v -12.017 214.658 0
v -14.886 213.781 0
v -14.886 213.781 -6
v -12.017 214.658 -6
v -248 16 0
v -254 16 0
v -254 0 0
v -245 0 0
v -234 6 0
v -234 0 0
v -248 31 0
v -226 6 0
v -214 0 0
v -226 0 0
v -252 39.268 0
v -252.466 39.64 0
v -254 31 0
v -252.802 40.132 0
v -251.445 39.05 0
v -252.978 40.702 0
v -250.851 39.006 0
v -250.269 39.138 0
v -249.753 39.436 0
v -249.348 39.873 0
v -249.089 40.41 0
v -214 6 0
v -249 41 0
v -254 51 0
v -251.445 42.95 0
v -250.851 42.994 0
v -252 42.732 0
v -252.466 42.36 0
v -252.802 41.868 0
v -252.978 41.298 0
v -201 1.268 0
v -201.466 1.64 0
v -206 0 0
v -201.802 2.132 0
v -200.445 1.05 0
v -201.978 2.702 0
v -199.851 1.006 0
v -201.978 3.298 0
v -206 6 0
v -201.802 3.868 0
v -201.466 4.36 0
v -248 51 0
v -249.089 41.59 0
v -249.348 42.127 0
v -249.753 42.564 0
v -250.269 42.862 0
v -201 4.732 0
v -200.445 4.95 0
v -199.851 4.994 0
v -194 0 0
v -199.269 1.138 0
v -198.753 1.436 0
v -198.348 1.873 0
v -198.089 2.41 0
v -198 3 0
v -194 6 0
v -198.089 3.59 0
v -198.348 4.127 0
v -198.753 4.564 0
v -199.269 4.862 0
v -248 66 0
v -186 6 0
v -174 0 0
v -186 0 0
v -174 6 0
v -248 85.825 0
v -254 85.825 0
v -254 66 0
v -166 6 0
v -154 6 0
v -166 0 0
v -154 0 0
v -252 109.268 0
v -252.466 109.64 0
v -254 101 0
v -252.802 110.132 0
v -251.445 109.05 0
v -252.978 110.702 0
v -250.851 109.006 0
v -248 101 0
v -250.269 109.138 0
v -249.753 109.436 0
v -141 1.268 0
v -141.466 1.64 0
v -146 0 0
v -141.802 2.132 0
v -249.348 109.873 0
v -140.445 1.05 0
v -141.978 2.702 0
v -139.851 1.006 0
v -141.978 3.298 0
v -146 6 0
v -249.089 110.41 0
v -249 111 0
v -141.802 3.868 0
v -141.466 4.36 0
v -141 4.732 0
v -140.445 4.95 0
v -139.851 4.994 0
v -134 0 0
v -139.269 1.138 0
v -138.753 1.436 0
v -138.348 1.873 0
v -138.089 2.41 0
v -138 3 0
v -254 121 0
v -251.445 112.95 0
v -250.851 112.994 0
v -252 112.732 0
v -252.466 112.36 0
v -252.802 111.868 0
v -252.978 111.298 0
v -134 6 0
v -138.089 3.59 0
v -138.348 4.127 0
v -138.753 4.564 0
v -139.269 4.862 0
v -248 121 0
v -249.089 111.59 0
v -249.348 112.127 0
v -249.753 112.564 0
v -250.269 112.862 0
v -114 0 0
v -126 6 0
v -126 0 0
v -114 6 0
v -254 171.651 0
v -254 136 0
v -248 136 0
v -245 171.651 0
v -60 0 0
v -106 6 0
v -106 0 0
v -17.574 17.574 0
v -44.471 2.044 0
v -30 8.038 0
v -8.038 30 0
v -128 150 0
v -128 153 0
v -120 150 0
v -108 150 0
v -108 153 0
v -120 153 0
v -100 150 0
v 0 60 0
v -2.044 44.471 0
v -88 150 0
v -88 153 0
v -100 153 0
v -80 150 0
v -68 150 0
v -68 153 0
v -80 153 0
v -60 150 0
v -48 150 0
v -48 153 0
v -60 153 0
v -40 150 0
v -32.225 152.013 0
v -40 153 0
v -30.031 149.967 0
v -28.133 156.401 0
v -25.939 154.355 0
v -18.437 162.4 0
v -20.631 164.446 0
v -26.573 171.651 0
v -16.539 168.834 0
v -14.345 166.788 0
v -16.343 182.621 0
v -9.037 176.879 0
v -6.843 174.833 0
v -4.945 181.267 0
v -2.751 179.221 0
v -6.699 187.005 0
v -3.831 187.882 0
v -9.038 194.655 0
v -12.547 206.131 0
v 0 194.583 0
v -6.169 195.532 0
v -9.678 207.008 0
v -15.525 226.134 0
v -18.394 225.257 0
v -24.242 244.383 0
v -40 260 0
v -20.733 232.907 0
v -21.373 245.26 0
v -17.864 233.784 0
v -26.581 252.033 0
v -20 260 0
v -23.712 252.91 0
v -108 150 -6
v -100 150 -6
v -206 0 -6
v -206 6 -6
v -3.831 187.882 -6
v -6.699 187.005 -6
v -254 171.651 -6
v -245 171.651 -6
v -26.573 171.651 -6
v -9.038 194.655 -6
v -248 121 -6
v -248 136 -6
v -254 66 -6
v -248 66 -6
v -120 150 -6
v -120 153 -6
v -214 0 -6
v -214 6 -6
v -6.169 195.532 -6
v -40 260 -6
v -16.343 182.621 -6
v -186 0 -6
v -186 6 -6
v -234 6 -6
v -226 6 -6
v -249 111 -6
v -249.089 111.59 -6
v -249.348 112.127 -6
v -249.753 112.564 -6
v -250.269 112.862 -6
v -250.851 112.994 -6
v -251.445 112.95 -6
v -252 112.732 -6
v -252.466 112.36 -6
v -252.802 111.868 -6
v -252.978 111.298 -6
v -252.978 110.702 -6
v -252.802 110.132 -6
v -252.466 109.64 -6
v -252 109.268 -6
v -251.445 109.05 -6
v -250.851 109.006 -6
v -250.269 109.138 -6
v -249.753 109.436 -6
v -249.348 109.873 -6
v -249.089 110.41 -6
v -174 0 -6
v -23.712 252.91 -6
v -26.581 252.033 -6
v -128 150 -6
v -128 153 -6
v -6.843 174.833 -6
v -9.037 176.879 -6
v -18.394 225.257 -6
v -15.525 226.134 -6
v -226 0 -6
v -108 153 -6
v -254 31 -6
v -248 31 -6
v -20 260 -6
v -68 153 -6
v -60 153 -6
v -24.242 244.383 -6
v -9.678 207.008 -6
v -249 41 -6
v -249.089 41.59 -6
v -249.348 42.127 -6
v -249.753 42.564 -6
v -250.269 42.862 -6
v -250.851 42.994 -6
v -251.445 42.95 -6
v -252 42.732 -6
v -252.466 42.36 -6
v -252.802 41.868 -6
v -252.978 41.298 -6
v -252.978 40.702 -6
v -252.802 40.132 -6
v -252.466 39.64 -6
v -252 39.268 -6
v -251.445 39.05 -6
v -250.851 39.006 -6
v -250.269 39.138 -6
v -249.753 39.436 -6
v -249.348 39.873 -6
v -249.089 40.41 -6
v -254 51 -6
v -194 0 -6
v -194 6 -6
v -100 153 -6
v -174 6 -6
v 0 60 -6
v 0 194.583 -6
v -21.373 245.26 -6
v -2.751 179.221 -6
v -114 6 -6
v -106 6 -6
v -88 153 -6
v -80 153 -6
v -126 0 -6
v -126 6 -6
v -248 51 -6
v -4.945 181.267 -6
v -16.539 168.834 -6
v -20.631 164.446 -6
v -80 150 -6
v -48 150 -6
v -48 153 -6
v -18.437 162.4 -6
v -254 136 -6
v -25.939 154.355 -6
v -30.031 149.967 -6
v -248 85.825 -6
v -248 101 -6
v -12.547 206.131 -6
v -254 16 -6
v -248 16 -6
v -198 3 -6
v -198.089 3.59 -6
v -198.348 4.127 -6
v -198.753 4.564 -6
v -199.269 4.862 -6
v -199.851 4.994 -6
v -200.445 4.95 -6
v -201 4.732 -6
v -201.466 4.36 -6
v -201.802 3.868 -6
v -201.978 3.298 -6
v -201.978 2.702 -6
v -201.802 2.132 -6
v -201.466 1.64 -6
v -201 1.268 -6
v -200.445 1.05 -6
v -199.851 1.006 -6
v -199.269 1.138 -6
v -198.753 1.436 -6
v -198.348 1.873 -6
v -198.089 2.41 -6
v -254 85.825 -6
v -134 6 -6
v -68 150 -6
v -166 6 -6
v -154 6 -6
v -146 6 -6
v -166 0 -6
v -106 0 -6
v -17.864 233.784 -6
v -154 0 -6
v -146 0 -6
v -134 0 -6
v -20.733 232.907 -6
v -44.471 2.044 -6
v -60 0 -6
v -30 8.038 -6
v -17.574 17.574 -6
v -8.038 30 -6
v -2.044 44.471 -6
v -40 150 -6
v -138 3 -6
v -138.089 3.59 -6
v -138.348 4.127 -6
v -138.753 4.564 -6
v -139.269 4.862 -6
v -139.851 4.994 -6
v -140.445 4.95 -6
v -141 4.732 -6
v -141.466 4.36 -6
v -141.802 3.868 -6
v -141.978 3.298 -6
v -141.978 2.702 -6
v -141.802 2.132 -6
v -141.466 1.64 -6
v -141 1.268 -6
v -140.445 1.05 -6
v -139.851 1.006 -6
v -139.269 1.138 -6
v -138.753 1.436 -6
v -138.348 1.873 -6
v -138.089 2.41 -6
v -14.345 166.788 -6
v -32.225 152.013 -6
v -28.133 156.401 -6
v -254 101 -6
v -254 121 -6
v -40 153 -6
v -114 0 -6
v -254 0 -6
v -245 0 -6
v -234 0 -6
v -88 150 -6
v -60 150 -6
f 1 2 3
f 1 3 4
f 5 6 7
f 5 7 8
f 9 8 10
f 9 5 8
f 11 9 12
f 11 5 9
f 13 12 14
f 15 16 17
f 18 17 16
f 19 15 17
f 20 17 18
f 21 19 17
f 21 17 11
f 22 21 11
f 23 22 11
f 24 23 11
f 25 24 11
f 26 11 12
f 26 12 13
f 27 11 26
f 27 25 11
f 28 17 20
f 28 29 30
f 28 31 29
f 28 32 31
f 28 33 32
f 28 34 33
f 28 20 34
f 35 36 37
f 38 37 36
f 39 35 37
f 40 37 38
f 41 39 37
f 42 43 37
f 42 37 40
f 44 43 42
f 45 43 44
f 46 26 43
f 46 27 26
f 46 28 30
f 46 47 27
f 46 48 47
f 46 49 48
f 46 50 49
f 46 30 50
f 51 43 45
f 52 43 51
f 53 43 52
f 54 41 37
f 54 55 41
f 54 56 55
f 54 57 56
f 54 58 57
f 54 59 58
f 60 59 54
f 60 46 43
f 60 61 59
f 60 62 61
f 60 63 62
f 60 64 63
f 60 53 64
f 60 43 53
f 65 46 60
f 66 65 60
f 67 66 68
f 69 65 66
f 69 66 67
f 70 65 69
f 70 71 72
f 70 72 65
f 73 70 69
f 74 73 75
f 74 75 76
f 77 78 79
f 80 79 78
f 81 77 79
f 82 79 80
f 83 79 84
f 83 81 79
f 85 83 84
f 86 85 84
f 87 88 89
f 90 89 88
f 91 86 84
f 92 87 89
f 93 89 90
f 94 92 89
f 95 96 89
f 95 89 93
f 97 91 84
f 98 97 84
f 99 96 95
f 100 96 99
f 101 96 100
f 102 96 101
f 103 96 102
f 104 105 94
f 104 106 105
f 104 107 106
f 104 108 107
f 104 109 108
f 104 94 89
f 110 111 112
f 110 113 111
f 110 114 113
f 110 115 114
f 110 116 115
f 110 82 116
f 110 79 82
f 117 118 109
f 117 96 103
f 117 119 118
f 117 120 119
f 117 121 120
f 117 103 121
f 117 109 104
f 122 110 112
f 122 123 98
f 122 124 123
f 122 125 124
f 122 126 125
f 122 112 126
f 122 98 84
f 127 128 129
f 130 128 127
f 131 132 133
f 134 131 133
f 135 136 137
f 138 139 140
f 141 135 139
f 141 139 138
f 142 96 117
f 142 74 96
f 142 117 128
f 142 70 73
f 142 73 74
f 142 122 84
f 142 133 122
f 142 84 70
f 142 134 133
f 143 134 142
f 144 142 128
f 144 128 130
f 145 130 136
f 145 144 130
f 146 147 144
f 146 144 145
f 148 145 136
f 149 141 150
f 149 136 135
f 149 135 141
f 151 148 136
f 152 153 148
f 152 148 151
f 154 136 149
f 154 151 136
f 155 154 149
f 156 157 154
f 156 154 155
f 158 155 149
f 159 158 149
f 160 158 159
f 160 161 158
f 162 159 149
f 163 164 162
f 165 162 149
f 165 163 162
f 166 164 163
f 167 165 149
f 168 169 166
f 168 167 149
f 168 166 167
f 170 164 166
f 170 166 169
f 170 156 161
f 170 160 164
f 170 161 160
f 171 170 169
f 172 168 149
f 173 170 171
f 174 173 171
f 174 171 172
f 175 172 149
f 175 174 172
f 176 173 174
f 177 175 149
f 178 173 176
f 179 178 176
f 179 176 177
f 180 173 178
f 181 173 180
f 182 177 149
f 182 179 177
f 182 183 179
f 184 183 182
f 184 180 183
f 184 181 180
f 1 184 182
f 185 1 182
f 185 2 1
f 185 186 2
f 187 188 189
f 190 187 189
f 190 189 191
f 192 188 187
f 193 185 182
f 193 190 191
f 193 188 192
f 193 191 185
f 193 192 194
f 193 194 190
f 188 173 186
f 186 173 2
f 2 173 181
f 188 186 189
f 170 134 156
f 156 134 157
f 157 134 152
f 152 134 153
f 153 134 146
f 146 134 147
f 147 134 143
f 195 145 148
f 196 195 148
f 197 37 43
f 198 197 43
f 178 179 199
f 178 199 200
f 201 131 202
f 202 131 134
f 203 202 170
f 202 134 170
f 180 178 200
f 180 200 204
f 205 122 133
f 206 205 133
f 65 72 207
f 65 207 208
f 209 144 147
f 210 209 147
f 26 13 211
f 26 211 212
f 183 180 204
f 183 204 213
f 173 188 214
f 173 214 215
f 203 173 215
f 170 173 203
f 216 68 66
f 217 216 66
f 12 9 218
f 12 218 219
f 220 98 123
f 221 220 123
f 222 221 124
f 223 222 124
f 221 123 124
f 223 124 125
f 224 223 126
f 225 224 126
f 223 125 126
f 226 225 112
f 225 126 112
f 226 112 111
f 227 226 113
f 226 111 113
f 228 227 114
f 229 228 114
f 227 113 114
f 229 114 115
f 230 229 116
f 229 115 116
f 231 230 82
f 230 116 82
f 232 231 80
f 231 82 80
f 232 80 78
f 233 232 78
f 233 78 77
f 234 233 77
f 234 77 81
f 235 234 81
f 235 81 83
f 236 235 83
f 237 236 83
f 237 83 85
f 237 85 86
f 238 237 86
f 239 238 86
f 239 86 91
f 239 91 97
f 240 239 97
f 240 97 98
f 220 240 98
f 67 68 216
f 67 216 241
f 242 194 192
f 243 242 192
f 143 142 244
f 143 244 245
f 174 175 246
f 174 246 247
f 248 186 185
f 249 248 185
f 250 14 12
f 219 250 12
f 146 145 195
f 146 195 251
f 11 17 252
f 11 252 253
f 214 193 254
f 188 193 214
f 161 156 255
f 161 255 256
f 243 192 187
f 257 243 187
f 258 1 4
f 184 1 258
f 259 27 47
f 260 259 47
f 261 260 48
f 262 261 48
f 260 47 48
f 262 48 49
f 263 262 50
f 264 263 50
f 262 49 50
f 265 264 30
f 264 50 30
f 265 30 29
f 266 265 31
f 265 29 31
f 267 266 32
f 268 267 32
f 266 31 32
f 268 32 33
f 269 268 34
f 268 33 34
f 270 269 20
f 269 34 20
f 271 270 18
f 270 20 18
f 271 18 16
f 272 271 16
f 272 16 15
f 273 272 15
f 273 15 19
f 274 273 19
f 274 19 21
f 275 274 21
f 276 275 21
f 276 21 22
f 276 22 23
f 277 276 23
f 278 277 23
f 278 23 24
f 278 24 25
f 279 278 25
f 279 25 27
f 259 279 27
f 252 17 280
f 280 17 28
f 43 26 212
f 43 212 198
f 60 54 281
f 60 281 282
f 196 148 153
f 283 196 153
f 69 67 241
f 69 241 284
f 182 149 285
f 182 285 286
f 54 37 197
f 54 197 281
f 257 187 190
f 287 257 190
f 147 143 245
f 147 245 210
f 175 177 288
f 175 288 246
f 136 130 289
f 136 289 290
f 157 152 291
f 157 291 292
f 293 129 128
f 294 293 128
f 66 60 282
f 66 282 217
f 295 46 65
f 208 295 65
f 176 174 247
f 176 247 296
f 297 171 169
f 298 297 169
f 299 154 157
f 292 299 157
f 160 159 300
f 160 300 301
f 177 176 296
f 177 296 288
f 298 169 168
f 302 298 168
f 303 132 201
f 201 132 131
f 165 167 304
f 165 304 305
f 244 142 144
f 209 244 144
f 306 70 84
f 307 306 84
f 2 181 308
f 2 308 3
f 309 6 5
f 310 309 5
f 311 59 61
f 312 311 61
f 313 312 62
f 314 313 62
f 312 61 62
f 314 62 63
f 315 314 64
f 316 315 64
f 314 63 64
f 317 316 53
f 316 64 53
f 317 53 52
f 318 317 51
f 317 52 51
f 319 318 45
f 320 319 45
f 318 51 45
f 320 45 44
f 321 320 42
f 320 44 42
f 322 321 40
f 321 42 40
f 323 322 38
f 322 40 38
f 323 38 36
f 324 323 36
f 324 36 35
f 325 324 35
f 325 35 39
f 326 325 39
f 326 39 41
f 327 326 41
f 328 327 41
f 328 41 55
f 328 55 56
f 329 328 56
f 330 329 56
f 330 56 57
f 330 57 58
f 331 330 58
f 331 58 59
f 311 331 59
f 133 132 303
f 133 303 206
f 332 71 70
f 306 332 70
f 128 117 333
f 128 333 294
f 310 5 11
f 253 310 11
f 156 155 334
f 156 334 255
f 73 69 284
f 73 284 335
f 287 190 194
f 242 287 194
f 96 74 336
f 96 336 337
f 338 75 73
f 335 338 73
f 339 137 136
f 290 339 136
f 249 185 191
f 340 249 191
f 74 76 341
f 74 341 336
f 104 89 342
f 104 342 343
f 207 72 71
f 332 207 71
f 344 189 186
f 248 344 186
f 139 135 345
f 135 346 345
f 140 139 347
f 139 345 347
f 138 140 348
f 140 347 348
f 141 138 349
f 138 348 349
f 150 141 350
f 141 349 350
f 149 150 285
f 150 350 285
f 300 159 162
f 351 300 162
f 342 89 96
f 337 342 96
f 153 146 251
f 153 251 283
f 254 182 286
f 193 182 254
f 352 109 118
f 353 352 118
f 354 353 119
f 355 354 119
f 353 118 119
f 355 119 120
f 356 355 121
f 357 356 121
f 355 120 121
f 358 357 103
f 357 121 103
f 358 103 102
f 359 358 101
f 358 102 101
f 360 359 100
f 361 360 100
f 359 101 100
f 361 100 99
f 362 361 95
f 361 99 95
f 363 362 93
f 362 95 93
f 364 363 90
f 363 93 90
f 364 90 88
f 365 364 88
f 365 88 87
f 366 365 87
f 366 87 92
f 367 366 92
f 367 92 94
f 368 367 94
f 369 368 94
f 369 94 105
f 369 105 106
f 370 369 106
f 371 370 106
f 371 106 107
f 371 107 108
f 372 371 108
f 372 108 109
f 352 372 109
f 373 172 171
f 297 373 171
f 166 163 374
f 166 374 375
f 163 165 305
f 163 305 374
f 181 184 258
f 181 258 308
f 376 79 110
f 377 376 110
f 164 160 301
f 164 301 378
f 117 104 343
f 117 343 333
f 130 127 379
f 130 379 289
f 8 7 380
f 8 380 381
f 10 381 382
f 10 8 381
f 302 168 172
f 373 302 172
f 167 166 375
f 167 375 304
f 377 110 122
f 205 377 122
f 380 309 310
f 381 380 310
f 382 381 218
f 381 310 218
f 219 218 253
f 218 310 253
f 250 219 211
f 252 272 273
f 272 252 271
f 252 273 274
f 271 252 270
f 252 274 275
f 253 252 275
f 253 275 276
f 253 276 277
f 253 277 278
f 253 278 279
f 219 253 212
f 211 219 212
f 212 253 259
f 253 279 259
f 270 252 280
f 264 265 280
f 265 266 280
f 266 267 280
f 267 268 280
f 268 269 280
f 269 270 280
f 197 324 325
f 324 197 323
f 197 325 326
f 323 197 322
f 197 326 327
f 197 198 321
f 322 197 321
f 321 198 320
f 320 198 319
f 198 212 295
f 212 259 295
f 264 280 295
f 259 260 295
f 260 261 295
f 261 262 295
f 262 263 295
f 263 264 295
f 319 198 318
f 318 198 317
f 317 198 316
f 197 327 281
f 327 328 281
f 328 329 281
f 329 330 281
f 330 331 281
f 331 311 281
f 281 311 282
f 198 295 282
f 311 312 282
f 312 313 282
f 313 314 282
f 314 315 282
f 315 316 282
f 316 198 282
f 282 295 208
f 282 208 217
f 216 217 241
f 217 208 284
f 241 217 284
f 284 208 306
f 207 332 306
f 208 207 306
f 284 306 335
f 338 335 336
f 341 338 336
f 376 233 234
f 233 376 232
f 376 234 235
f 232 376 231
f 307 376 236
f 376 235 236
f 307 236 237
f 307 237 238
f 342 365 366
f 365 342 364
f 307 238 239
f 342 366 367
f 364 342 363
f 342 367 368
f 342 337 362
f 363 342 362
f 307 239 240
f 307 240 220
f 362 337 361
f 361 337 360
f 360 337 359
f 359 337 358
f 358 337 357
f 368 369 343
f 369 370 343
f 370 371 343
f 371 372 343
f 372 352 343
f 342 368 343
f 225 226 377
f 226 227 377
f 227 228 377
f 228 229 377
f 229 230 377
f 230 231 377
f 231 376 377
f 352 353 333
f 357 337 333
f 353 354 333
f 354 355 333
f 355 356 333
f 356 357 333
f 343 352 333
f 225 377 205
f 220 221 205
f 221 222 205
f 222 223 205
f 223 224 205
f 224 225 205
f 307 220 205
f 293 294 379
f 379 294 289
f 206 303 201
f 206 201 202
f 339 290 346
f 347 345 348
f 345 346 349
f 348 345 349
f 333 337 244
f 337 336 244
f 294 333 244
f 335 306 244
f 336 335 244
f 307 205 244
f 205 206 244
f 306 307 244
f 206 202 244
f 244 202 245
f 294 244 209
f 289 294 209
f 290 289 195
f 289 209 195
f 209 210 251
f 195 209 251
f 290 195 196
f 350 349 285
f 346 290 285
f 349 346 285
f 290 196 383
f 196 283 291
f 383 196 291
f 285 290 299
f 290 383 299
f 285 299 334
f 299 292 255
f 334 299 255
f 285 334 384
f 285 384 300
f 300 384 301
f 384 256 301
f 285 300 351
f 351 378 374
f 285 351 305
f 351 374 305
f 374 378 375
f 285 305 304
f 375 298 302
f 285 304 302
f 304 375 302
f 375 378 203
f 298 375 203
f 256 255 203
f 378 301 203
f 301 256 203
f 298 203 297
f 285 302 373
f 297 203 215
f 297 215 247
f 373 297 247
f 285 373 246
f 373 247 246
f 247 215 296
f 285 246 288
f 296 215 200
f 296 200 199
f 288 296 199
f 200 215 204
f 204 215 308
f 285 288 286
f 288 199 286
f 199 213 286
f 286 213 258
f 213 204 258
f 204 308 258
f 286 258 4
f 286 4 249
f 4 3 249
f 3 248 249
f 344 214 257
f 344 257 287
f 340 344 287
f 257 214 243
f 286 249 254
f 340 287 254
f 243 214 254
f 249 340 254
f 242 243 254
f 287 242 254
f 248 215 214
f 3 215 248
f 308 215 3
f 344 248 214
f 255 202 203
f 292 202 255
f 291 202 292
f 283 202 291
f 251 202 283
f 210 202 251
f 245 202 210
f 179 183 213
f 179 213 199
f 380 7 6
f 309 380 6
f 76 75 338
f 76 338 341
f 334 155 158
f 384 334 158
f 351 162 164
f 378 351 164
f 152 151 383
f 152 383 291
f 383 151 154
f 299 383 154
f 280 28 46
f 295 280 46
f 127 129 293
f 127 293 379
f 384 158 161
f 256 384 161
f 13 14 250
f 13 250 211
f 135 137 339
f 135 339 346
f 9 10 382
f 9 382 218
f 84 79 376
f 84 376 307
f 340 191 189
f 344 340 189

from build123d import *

# Parameters (mm, degrees)
ESQUISSE1_W              = 340
ESQUISSE1_H              = 260
BOSS_EXTRU_1_DEPTH       = 6
CONG_1_R                 = 60
ESQUISSE14_W             = 180
ESQUISSE14_H             = 10
ENL_V_MAT_EXTRU_7_DEPTH  = 10
ESQUISSE15_W             = 120
ESQUISSE15_H             = 2
ENL_V_MAT_EXTRU_8_DEPTH  = 10
CONG_2_R                 = 10
CONG_3_R                 = 8
ENL_V_MAT_EXTRU_10_DEPTH = 10
ESQUISSE18_W             = 8
ESQUISSE18_H             = 6
ENL_V_MAT_EXTRU_11_DEPTH = 10
ENL_V_MAT_EXTRU_13_DEPTH = 6
ENL_V_MAT_EXTRU_14_DEPTH = 10
ESQUISSE21_W             = 95
ESQUISSE21_H             = 171.650635095
ENL_V_MAT_EXTRU_15_DEPTH = 10
BOSS_EXTRU_3_DEPTH       = 6
ENL_V_MAT_EXTRU_18_DEPTH = 6
ESQUISSE25_W             = 8
ESQUISSE25_H             = 3
ENL_V_MAT_EXTRU_17_DEPTH = 6
ESQUISSE30_W             = 9
ESQUISSE30_H             = 171.650635095
BOSS_EXTRU_4_DEPTH       = 6
ESQUISSE32_W             = 6
ESQUISSE32_H             = 15
ESQUISSE32_H_2           = 15.174682453
ENL_V_MAT_EXTRU_19_DEPTH = 6
ESQUISSE33_R             = 2
ENL_V_MAT_EXTRU_20_DEPTH = 364.527165422


with BuildPart() as part:
    # Esquisse1 → Boss.-Extru.1 (new body)
    with BuildSketch(Plane.XY):
        with Locations((-170, 130)):
            Rectangle(ESQUISSE1_W, ESQUISSE1_H)
    extrude(amount=-BOSS_EXTRU_1_DEPTH)

    # Congé1
    cong_1_edges = [part.edges().sort_by_distance(p)[0] for p in [
        (0, 0, -3),
        (-340, 0, -3),
    ]]
    fillet(cong_1_edges, radius=CONG_1_R)

    # Esquisse14 → Enlèv. mat.-Extru.7 (cut)
    with BuildSketch(Plane(origin=(0, 0, -6), x_dir=(-1, 0, 0), z_dir=(0, 0, -1))):
        with Locations((235, 255)):
            Rectangle(ESQUISSE14_W, ESQUISSE14_H)
    extrude(amount=-ENL_V_MAT_EXTRU_7_DEPTH, mode=Mode.SUBTRACT)

    # Esquisse15 → Enlèv. mat.-Extru.8 (cut)
    with BuildSketch(Plane.XY):
        with Locations((-250, 249)):
            Rectangle(ESQUISSE15_W, ESQUISSE15_H)
    extrude(amount=-ENL_V_MAT_EXTRU_8_DEPTH, mode=Mode.SUBTRACT)

    # Congé2
    # the kernel refuses this fillet: 10 mm, written as the material it takes off along each edge
    with BuildSketch(Plane(origin=(-190, 250, 15), x_dir=(1, 0, 0), z_dir=(0, 0, -1))) as cong_2_piece_1:
        with BuildLine():
            CenterArc((6, 10), CONG_2_R, 233.130102354, 36.869897646)
            Line((0, 2), (-0.12, 1.84))
            ThreePointArc((-0.12, 1.84), (-0.2, 1), (-0.2, 0))
            Line((-0.2, 0), (0, -0.2))
            Line((0, -0.2), (6, -0.2))
            Line((6, -0.2), (6, 0))
        make_face()
    extrude(amount=36, mode=Mode.SUBTRACT)
    with BuildSketch(Plane(origin=(-310, 250, 15), x_dir=(0, -1, 0), z_dir=(0, 0, -1))) as cong_2_piece_2:
        with BuildLine():
            CenterArc((10, 6), CONG_2_R, 180, 36.869897646)
            Line((0, 6), (-0.2, 6))
            Line((-0.2, 6), (-0.2, 0))
            Line((-0.2, 0), (0, -0.2))
            ThreePointArc((0, -0.2), (1, -0.2), (1.84, -0.12))
            Line((1.84, -0.12), (2, 0))
        make_face()
    extrude(amount=36, mode=Mode.SUBTRACT)

    # Congé3
    cong_3_edges = [part.edges().sort_by_distance(p)[0] for p in [
        (-145, 260, -3),
        (-325, 260, -3),
    ]]
    fillet(cong_3_edges, radius=CONG_3_R)

    # Esquisse17 → Enlèv. mat.-Extru.10 (cut)
    with BuildSketch(Plane.XY):
        Polygon((-29.216285169, 245.39755551), (-23.478456633, 247.151785738), (-25.817430271, 254.802223786), (-31.555258806, 253.047993558), align=None)
        Polygon((-23.368851074, 226.271460391), (-17.631022538, 228.025690619), (-19.969996176, 235.676128667), (-25.707824712, 233.921898438), align=None)
        Polygon((-17.52141698, 207.145365271), (-11.783588444, 208.8995955), (-14.122562082, 216.550033547), (-19.860390617, 214.795803319), align=None)
        Polygon((-180, 150), (-30, 150), (-2.720065597, 179.254148065), (-9.568281369, 188.663047712), (-5.936154349, 189.77350038), (-8.275127987, 197.423938428), (-14.012956523, 195.6697082), (-13.538488979, 194.117794792), (-102.15398245, 315.868381088), (-205, 193.301270189), align=None)
    extrude(amount=-ENL_V_MAT_EXTRU_10_DEPTH, mode=Mode.SUBTRACT)

    # Esquisse18 → Enlèv. mat.-Extru.11 (cut)
    with BuildSketch(Plane.XY):
        with Locations((-110, 3)):
            Rectangle(ESQUISSE18_W, ESQUISSE18_H)
        with Locations((-130, 3)):
            Rectangle(ESQUISSE18_W, ESQUISSE18_H)
        with Locations((-150, 3)):
            Rectangle(ESQUISSE18_W, ESQUISSE18_H)
        with Locations((-170, 3)):
            Rectangle(ESQUISSE18_W, ESQUISSE18_H)
        with Locations((-190, 3)):
            Rectangle(ESQUISSE18_W, ESQUISSE18_H)
        with Locations((-210, 3)):
            Rectangle(ESQUISSE18_W, ESQUISSE18_H)
        with Locations((-230, 3)):
            Rectangle(ESQUISSE18_W, ESQUISSE18_H)
    extrude(amount=-ENL_V_MAT_EXTRU_11_DEPTH, mode=Mode.SUBTRACT)

    # Esquisse19 → Enlèv. mat.-Extru.13 (cut)
    with BuildSketch(Plane.XY):
        Polygon((-27.406549935, 260), (-61.490489073, 260), (-13.538488979, 194.117794792), (-14.012956523, 195.6697082), (-8.275127987, 197.423938428), (-5.936154349, 189.77350038), (-9.568281369, 188.663047712), (-2.720065597, 179.254148065), (0, 179.254148065), (0, 193.164126288), (0, 260), align=None)
        Polygon((-19.860390617, 214.795803319), (-14.122562082, 216.550033547), (-11.783588444, 208.8995955), (-17.52141698, 207.145365271), align=None, mode=Mode.SUBTRACT)
        Polygon((-25.707824712, 233.921898438), (-19.969996176, 235.676128667), (-17.631022538, 228.025690619), (-23.368851074, 226.271460391), align=None, mode=Mode.SUBTRACT)
        Polygon((-23.478456633, 247.151785738), (-29.216285169, 245.39755551), (-31.555258806, 253.047993558), (-25.817430271, 254.802223786), align=None, mode=Mode.SUBTRACT)
    extrude(amount=-ENL_V_MAT_EXTRU_13_DEPTH, mode=Mode.SUBTRACT)

    # Esquisse20 → Enlèv. mat.-Extru.14 (cut)
    with BuildSketch(Plane.XY):
        Polygon((-192.5, 171.650635095), (-340, 171.650635095), (-340, 260), (-157.424116728, 260.642727797), (-157.424116728, 250), align=None)
    extrude(amount=-ENL_V_MAT_EXTRU_14_DEPTH, mode=Mode.SUBTRACT)

    # Esquisse21 → Enlèv. mat.-Extru.15 (cut)
    with BuildSketch(Plane.XY):
        with Locations((-292.5, 85.825317548)):
            Rectangle(ESQUISSE21_W, ESQUISSE21_H)
    extrude(amount=-ENL_V_MAT_EXTRU_15_DEPTH, mode=Mode.SUBTRACT)

    # Esquisse27 → Boss.-Extru.3 (add)
    with BuildSketch(Plane.XY):
        Polygon((0, 179.254148065), (0, 194.58294763), (-20, 260), (-40, 260), (-192.5, 171.650635095), (-180, 150), (-30, 150), align=None)
    extrude(amount=-BOSS_EXTRU_3_DEPTH)

    # Esquisse29 → Enlèv. mat.-Extru.18 (cut)
    with BuildSketch(Plane.XY):
        Polygon((-40, 260), (-16.342847445, 182.620940619), (-26.572822846, 171.650635095), (-192.5, 171.650635095), align=None)
    extrude(amount=-ENL_V_MAT_EXTRU_18_DEPTH, mode=Mode.SUBTRACT)

    # Esquisse25 → Enlèv. mat.-Extru.17 (cut)
    with BuildSketch(Plane.XY):
        with Locations((-124, 151.5)):
            Rectangle(ESQUISSE25_W, ESQUISSE25_H)
        with Locations((-104, 151.5)):
            Rectangle(ESQUISSE25_W, ESQUISSE25_H)
        with Locations((-84, 151.5)):
            Rectangle(ESQUISSE25_W, ESQUISSE25_H)
        with Locations((-64, 151.5)):
            Rectangle(ESQUISSE25_W, ESQUISSE25_H)
        with Locations((-44, 151.5)):
            Rectangle(ESQUISSE25_W, ESQUISSE25_H)
        Polygon((-32.225134911, 152.012672503), (-28.133144751, 156.400794713), (-25.939083646, 154.354799632), (-30.031073806, 149.966677423), align=None)
        Polygon((-20.63116279, 164.44568543), (-18.437101685, 162.39969035), (-14.345111525, 166.78781256), (-16.53917263, 168.83380764), align=None)
        Polygon((-6.843129564, 174.832703278), (-9.037190669, 176.878698358), (-4.945200508, 181.266820568), (-2.751139404, 179.220825487), align=None)
        Polygon((-9.038404375, 194.655087151), (-6.169490107, 195.532202265), (-3.830516469, 187.881764218), (-6.699430737, 187.004649103), align=None)
        Polygon((-9.677950563, 207.007859337), (-12.546864831, 206.130744223), (-14.885838469, 213.78118227), (-12.016924201, 214.658297384), align=None)
        Polygon((-18.394298926, 225.256839342), (-15.525384658, 226.133954456), (-17.864358296, 233.784392504), (-20.733272563, 232.90727739), align=None)
        Polygon((-21.372818752, 245.260049575), (-23.71179239, 252.910487623), (-26.580706658, 252.033372509), (-24.24173302, 244.382934461), align=None)
    extrude(amount=-ENL_V_MAT_EXTRU_17_DEPTH, mode=Mode.SUBTRACT)

    # Esquisse30 → Boss.-Extru.4 (add)
    with BuildSketch(Plane.XY):
        with Locations((-249.5, 85.825317548)):
            Rectangle(ESQUISSE30_W, ESQUISSE30_H)
    extrude(amount=-BOSS_EXTRU_4_DEPTH)

    # Esquisse32 → Enlèv. mat.-Extru.19 (cut)
    with BuildSketch(Plane.XY):
        with Locations((-251, 128.5)):
            Rectangle(ESQUISSE32_W, ESQUISSE32_H)
        with Locations((-251, 93.412658773)):
            Rectangle(ESQUISSE32_W, ESQUISSE32_H_2)
        with Locations((-251, 58.5)):
            Rectangle(ESQUISSE32_W, ESQUISSE32_H)
        with Locations((-251, 23.5)):
            Rectangle(ESQUISSE32_W, ESQUISSE32_H)
    extrude(amount=-ENL_V_MAT_EXTRU_19_DEPTH, mode=Mode.SUBTRACT)

    # Esquisse33 → Enlèv. mat.-Extru.20 (cut, through all)
    with BuildSketch(Plane.XY):
        with Locations((-200, 3)):
            Circle(ESQUISSE33_R)
        with Locations((-140, 3)):
            Circle(ESQUISSE33_R)
        with Locations((-251, 41)):
            Circle(ESQUISSE33_R)
        with Locations((-251, 111)):
            Circle(ESQUISSE33_R)
    extrude(amount=-ENL_V_MAT_EXTRU_20_DEPTH, mode=Mode.SUBTRACT)


solid = part.part
